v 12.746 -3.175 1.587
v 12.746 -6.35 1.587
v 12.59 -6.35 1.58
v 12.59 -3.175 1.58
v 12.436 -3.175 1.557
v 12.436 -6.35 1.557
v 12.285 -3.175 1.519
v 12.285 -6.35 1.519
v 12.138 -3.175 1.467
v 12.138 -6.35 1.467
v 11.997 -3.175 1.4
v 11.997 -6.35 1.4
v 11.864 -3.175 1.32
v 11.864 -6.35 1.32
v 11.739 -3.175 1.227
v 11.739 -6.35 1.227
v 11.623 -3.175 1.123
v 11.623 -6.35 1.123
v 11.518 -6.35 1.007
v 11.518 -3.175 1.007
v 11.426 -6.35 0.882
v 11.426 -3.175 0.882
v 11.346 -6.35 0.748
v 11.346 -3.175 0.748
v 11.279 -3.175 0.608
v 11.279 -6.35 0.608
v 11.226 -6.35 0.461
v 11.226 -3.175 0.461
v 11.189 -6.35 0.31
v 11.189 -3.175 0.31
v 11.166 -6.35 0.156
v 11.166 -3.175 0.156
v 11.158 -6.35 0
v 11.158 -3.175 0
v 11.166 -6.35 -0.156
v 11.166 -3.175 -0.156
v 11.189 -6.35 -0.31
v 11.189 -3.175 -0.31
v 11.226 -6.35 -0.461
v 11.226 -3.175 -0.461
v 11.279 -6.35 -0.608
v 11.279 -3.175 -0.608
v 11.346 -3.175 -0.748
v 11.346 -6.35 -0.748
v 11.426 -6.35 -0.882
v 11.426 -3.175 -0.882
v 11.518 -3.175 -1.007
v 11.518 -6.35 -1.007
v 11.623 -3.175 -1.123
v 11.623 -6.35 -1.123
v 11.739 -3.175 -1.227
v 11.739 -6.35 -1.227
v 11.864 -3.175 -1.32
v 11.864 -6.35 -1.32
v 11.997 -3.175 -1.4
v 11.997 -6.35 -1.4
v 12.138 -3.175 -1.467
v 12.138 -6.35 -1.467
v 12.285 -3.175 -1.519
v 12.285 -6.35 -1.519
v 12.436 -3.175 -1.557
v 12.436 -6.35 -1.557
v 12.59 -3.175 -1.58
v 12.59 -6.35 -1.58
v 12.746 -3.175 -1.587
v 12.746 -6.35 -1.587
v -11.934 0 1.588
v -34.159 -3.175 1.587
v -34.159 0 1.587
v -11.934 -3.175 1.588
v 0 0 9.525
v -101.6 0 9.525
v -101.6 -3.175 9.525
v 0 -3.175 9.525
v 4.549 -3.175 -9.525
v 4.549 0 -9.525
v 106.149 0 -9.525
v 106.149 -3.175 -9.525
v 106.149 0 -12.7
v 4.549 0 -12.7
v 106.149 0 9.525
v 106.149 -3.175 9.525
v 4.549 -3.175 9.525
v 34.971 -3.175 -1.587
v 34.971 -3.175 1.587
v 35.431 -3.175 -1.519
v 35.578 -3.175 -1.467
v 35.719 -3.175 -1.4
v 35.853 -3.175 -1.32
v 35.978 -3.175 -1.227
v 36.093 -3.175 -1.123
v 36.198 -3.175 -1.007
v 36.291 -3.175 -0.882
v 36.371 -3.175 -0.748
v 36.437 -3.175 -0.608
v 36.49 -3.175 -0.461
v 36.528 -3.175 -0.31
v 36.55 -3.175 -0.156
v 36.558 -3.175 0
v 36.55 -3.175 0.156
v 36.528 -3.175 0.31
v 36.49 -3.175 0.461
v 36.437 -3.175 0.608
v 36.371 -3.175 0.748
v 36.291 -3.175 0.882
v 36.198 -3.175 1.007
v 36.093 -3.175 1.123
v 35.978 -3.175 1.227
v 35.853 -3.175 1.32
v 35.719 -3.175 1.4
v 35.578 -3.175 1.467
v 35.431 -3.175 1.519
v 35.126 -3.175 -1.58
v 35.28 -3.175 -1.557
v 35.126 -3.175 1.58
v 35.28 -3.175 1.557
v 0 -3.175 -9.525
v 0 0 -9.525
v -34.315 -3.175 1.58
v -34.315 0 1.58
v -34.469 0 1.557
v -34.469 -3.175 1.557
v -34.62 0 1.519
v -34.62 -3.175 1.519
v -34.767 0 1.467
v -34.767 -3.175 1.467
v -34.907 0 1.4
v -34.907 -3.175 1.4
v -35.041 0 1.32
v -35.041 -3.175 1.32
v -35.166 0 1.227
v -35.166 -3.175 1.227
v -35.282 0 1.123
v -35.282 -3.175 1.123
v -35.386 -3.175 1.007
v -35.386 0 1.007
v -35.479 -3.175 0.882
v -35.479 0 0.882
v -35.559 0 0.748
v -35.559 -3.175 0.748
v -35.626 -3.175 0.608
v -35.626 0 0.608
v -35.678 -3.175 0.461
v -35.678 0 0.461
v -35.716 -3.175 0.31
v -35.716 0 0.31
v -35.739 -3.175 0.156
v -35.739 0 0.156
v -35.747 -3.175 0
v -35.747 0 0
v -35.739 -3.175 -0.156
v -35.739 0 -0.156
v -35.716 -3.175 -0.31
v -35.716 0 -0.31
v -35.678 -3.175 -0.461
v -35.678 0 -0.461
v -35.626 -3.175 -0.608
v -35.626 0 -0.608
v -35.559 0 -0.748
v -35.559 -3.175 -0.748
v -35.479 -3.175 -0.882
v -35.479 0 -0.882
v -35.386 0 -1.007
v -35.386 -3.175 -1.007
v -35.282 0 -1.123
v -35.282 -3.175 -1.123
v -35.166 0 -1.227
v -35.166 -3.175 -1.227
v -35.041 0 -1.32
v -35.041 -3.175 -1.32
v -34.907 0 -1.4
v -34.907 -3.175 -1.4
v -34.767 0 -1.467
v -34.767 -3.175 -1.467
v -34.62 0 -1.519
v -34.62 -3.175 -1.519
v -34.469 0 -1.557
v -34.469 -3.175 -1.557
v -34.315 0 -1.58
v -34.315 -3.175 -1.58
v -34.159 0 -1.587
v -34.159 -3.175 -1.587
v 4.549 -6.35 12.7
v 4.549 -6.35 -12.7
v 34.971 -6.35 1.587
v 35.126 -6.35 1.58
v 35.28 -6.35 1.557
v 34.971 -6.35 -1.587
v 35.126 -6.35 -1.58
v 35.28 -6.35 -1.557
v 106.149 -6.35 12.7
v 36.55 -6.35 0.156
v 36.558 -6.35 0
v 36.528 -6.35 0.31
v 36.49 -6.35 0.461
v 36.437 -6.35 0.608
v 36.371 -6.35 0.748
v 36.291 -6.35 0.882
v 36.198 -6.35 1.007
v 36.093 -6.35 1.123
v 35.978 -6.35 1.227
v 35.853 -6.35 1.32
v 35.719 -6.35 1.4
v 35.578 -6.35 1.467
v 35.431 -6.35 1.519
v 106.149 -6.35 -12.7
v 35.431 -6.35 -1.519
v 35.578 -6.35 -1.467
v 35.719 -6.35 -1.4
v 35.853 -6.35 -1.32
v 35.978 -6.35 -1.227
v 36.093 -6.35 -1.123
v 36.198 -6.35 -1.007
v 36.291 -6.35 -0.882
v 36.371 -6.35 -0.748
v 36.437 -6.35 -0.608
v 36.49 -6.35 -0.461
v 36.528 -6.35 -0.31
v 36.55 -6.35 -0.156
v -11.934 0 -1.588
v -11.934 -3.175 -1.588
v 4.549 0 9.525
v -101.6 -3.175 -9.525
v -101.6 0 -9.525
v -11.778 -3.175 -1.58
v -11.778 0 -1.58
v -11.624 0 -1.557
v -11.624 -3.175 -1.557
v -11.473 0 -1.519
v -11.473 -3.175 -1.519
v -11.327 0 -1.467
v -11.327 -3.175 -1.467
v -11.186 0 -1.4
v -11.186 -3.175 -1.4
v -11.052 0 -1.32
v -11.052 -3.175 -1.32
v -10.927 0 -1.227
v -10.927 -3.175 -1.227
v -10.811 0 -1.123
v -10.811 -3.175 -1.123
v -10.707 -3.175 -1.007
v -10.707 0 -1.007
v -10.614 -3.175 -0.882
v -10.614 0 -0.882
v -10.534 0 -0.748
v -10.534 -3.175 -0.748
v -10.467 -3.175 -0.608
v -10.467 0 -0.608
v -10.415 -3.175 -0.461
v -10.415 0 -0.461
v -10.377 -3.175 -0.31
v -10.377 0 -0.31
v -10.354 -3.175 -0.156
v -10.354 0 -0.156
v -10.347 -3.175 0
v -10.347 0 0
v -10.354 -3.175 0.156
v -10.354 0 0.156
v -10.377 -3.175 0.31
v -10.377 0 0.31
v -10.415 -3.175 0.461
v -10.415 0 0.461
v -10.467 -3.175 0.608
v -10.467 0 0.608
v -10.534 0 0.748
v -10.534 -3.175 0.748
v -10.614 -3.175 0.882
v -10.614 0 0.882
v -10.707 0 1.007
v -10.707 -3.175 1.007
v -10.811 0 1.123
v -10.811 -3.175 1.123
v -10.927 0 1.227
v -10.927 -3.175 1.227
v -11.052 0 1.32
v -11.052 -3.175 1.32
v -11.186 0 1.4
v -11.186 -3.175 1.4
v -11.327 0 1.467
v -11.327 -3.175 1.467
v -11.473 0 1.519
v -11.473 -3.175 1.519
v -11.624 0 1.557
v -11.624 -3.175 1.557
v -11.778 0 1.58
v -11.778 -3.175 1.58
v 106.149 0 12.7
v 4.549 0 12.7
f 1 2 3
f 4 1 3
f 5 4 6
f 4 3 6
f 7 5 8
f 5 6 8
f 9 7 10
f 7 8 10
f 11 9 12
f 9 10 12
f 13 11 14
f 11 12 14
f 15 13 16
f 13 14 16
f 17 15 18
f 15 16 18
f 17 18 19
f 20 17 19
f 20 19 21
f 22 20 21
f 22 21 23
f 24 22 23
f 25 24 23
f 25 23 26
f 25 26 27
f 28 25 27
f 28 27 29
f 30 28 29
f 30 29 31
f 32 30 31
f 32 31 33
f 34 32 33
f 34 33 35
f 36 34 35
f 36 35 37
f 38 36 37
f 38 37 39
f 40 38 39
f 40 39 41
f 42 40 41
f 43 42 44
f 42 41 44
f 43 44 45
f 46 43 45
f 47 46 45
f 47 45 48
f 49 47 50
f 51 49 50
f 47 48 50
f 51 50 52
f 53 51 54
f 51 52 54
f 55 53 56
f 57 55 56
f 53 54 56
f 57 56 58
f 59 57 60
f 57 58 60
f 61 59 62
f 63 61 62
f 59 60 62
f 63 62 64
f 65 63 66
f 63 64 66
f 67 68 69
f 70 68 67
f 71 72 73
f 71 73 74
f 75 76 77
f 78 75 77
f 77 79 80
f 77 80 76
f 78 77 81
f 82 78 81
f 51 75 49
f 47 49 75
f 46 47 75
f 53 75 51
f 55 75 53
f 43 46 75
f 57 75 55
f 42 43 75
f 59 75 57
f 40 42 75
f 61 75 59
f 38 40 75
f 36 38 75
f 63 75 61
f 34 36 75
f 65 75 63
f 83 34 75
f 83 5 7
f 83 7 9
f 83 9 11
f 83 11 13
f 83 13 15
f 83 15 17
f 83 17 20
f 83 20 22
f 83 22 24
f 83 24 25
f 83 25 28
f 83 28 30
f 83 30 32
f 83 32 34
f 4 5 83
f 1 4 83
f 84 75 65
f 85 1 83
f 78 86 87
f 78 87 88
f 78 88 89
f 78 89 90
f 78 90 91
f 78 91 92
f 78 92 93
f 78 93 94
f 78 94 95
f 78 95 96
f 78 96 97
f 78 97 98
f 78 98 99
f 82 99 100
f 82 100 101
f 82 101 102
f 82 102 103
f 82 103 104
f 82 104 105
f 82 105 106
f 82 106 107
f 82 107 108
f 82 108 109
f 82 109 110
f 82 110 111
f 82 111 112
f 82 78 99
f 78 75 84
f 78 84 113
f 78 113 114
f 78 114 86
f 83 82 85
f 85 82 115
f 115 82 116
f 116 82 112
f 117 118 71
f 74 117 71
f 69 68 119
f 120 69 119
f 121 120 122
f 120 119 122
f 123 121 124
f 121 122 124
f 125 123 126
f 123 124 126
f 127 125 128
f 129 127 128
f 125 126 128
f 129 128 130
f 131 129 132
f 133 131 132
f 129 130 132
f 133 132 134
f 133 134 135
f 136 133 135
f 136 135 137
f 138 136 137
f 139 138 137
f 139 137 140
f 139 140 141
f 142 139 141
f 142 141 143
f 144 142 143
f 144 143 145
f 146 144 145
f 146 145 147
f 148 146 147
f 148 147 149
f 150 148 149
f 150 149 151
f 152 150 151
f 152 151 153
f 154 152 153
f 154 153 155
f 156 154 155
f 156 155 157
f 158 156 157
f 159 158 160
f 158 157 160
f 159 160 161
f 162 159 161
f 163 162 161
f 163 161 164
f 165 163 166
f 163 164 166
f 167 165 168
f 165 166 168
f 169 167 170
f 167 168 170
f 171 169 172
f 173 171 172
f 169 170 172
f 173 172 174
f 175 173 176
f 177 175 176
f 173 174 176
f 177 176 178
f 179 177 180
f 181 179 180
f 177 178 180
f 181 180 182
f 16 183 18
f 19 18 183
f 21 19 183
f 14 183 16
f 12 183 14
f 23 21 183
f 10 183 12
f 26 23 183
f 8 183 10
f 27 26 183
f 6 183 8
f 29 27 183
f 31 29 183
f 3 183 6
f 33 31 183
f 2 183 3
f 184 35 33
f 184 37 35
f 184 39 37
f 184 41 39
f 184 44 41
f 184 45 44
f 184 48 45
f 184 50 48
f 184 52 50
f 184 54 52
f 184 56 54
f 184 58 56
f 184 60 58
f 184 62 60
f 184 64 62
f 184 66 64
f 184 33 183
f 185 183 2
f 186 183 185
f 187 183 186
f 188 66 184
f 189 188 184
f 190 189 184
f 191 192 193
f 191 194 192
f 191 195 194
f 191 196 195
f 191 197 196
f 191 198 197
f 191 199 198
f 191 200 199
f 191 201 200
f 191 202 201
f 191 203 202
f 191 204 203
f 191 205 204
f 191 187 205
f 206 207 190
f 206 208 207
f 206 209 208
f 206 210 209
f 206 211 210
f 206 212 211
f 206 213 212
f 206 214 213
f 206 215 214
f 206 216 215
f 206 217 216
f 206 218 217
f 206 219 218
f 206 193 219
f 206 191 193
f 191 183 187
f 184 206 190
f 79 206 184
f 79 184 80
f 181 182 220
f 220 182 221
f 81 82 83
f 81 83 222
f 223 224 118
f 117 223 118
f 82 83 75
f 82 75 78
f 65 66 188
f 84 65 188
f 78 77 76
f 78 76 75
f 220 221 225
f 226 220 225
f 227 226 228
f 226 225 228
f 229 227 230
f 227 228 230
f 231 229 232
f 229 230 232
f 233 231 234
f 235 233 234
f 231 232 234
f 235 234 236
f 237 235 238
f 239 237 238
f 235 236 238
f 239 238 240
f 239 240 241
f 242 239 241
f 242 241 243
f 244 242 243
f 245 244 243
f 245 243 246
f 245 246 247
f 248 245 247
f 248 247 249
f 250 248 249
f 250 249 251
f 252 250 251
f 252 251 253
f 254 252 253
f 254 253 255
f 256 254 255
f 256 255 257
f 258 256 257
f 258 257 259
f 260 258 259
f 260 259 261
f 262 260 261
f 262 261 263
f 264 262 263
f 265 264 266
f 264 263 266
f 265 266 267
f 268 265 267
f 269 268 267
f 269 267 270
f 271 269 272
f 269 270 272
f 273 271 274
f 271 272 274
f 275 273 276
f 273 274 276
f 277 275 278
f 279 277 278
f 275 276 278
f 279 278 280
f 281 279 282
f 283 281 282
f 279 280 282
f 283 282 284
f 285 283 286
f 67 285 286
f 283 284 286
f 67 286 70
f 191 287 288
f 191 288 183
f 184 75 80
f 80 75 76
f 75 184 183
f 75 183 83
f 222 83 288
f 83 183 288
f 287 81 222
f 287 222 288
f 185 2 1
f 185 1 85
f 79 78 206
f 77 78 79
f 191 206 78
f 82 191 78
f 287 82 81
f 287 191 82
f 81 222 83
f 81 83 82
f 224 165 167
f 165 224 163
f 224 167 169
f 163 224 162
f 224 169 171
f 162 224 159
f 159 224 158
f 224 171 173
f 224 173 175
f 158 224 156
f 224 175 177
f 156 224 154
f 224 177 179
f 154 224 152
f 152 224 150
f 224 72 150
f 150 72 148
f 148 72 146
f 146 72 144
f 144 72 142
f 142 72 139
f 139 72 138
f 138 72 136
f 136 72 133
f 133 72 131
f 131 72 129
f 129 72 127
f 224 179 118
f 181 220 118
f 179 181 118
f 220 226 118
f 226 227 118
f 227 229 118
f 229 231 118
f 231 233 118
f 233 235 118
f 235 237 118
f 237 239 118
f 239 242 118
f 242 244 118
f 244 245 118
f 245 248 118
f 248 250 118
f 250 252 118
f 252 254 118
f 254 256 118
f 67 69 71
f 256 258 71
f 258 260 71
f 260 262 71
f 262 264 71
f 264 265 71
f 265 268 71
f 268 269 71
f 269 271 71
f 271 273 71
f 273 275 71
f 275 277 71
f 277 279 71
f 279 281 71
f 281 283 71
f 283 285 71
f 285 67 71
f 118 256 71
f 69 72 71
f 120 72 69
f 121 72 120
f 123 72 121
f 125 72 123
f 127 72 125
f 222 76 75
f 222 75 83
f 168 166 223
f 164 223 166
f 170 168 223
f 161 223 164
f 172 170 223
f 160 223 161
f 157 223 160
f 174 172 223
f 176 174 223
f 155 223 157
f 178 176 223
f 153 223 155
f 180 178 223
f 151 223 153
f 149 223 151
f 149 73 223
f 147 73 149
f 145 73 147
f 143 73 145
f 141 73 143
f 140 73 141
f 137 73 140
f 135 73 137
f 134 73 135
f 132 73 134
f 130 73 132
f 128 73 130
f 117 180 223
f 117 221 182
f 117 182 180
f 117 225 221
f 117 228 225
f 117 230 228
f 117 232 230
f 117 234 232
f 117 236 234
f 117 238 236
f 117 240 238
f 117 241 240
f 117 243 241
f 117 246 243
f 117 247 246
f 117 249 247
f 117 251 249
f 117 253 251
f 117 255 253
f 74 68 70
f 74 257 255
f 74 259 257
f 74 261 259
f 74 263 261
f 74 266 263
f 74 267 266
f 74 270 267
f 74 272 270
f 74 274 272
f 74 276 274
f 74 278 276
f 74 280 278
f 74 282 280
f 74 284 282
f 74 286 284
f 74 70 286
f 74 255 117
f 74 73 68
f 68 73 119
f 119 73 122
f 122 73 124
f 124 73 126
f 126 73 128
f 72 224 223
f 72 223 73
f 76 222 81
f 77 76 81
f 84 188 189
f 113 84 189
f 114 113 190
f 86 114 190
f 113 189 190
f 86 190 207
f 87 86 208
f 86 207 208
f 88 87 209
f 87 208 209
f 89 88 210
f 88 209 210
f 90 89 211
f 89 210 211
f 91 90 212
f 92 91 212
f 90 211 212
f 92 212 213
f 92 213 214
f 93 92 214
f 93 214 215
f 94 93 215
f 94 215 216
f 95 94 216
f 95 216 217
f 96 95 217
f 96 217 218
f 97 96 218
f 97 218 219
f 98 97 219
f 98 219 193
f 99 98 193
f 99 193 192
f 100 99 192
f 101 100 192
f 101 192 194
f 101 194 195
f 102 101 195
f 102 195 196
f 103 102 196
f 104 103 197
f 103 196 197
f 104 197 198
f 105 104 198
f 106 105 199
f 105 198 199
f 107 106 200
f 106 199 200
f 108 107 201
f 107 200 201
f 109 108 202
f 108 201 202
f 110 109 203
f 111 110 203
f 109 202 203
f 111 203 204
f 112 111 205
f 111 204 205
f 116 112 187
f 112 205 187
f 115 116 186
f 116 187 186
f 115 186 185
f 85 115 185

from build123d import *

# Parameters (mm, degrees)
F0_W     = 101.6
F0_H     = 19.05
F1_DEPTH = 3.175
F4_DEPTH = 101.6
F5_W     = 22.225
F5_H     = 3.175
F6_DEPTH = 3.176
F7_W     = 22.225
F7_H     = 3.175
F8_DEPTH = 25.4


with BuildPart() as f1:
    # F0 (on Front) → F1 (new body)
    with BuildSketch(Plane.XZ):
        with Locations((-50.8, 0)):
            Rectangle(F0_W, F0_H)
    extrude(amount=F1_DEPTH)


with BuildPart() as f2_1:
    # F2: copy of F1
    add(f1.part.moved(Location((106.14878, 0, 0))))


with BuildPart() as f4:
    # F3 (on face) → F4 (new body, through all)
    with BuildSketch(Plane.YZ.offset(106.14878)):
        Polygon((0, -12.7), (0, -9.525), (-3.175, -9.525), (-3.175, 9.525), (0, 9.525), (0, 12.7), (-6.35, 12.7), (-6.35, -12.7), align=None)
    extrude(amount=-F4_DEPTH)

    # F7 (on face) → F8 (cut)
    with BuildSketch(Plane.XZ.offset(6.35)):
        with Locations((23.8581371099, 0)):
            Rectangle(F7_W, F7_H)
        with BuildLine():
            Line((12.7456371099, -1.5875), (12.7456371099, 1.5875))
            ThreePointArc((12.7456371099, 1.5875), (11.1581371099, 0), (12.7456371099, -1.5875))
        make_face()
        with BuildLine():
            ThreePointArc((34.9706371099, -1.5875), (36.5581371099, 0), (34.9706371099, 1.5875))
            Line((34.9706371099, 1.5875), (34.9706371099, -1.5875))
        make_face()
    extrude(amount=-F8_DEPTH, mode=Mode.SUBTRACT)


with BuildPart() as f1_1:
    add(f1.part)

    # F5 (on face) → F6 (cut, through all)
    with BuildSketch(Plane.XZ.offset(3.175)):
        with Locations((-23.0465307151, 0)):
            Rectangle(F5_W, F5_H)
        with BuildLine():
            Line((-34.1590307151, -1.5875), (-34.1590307151, 1.5875))
            ThreePointArc((-34.1590307151, 1.5875), (-35.7465307151, 0), (-34.1590307151, -1.5875))
        make_face()
        with BuildLine():
            ThreePointArc((-11.9340307151, -1.5875), (-10.3465307151, 0), (-11.9340307151, 1.5875))
            Line((-11.9340307151, 1.5875), (-11.9340307151, -1.5875))
        make_face()
    extrude(amount=-F6_DEPTH, mode=Mode.SUBTRACT)


solid = Compound([f2_1.part, f4.part, f1_1.part])
